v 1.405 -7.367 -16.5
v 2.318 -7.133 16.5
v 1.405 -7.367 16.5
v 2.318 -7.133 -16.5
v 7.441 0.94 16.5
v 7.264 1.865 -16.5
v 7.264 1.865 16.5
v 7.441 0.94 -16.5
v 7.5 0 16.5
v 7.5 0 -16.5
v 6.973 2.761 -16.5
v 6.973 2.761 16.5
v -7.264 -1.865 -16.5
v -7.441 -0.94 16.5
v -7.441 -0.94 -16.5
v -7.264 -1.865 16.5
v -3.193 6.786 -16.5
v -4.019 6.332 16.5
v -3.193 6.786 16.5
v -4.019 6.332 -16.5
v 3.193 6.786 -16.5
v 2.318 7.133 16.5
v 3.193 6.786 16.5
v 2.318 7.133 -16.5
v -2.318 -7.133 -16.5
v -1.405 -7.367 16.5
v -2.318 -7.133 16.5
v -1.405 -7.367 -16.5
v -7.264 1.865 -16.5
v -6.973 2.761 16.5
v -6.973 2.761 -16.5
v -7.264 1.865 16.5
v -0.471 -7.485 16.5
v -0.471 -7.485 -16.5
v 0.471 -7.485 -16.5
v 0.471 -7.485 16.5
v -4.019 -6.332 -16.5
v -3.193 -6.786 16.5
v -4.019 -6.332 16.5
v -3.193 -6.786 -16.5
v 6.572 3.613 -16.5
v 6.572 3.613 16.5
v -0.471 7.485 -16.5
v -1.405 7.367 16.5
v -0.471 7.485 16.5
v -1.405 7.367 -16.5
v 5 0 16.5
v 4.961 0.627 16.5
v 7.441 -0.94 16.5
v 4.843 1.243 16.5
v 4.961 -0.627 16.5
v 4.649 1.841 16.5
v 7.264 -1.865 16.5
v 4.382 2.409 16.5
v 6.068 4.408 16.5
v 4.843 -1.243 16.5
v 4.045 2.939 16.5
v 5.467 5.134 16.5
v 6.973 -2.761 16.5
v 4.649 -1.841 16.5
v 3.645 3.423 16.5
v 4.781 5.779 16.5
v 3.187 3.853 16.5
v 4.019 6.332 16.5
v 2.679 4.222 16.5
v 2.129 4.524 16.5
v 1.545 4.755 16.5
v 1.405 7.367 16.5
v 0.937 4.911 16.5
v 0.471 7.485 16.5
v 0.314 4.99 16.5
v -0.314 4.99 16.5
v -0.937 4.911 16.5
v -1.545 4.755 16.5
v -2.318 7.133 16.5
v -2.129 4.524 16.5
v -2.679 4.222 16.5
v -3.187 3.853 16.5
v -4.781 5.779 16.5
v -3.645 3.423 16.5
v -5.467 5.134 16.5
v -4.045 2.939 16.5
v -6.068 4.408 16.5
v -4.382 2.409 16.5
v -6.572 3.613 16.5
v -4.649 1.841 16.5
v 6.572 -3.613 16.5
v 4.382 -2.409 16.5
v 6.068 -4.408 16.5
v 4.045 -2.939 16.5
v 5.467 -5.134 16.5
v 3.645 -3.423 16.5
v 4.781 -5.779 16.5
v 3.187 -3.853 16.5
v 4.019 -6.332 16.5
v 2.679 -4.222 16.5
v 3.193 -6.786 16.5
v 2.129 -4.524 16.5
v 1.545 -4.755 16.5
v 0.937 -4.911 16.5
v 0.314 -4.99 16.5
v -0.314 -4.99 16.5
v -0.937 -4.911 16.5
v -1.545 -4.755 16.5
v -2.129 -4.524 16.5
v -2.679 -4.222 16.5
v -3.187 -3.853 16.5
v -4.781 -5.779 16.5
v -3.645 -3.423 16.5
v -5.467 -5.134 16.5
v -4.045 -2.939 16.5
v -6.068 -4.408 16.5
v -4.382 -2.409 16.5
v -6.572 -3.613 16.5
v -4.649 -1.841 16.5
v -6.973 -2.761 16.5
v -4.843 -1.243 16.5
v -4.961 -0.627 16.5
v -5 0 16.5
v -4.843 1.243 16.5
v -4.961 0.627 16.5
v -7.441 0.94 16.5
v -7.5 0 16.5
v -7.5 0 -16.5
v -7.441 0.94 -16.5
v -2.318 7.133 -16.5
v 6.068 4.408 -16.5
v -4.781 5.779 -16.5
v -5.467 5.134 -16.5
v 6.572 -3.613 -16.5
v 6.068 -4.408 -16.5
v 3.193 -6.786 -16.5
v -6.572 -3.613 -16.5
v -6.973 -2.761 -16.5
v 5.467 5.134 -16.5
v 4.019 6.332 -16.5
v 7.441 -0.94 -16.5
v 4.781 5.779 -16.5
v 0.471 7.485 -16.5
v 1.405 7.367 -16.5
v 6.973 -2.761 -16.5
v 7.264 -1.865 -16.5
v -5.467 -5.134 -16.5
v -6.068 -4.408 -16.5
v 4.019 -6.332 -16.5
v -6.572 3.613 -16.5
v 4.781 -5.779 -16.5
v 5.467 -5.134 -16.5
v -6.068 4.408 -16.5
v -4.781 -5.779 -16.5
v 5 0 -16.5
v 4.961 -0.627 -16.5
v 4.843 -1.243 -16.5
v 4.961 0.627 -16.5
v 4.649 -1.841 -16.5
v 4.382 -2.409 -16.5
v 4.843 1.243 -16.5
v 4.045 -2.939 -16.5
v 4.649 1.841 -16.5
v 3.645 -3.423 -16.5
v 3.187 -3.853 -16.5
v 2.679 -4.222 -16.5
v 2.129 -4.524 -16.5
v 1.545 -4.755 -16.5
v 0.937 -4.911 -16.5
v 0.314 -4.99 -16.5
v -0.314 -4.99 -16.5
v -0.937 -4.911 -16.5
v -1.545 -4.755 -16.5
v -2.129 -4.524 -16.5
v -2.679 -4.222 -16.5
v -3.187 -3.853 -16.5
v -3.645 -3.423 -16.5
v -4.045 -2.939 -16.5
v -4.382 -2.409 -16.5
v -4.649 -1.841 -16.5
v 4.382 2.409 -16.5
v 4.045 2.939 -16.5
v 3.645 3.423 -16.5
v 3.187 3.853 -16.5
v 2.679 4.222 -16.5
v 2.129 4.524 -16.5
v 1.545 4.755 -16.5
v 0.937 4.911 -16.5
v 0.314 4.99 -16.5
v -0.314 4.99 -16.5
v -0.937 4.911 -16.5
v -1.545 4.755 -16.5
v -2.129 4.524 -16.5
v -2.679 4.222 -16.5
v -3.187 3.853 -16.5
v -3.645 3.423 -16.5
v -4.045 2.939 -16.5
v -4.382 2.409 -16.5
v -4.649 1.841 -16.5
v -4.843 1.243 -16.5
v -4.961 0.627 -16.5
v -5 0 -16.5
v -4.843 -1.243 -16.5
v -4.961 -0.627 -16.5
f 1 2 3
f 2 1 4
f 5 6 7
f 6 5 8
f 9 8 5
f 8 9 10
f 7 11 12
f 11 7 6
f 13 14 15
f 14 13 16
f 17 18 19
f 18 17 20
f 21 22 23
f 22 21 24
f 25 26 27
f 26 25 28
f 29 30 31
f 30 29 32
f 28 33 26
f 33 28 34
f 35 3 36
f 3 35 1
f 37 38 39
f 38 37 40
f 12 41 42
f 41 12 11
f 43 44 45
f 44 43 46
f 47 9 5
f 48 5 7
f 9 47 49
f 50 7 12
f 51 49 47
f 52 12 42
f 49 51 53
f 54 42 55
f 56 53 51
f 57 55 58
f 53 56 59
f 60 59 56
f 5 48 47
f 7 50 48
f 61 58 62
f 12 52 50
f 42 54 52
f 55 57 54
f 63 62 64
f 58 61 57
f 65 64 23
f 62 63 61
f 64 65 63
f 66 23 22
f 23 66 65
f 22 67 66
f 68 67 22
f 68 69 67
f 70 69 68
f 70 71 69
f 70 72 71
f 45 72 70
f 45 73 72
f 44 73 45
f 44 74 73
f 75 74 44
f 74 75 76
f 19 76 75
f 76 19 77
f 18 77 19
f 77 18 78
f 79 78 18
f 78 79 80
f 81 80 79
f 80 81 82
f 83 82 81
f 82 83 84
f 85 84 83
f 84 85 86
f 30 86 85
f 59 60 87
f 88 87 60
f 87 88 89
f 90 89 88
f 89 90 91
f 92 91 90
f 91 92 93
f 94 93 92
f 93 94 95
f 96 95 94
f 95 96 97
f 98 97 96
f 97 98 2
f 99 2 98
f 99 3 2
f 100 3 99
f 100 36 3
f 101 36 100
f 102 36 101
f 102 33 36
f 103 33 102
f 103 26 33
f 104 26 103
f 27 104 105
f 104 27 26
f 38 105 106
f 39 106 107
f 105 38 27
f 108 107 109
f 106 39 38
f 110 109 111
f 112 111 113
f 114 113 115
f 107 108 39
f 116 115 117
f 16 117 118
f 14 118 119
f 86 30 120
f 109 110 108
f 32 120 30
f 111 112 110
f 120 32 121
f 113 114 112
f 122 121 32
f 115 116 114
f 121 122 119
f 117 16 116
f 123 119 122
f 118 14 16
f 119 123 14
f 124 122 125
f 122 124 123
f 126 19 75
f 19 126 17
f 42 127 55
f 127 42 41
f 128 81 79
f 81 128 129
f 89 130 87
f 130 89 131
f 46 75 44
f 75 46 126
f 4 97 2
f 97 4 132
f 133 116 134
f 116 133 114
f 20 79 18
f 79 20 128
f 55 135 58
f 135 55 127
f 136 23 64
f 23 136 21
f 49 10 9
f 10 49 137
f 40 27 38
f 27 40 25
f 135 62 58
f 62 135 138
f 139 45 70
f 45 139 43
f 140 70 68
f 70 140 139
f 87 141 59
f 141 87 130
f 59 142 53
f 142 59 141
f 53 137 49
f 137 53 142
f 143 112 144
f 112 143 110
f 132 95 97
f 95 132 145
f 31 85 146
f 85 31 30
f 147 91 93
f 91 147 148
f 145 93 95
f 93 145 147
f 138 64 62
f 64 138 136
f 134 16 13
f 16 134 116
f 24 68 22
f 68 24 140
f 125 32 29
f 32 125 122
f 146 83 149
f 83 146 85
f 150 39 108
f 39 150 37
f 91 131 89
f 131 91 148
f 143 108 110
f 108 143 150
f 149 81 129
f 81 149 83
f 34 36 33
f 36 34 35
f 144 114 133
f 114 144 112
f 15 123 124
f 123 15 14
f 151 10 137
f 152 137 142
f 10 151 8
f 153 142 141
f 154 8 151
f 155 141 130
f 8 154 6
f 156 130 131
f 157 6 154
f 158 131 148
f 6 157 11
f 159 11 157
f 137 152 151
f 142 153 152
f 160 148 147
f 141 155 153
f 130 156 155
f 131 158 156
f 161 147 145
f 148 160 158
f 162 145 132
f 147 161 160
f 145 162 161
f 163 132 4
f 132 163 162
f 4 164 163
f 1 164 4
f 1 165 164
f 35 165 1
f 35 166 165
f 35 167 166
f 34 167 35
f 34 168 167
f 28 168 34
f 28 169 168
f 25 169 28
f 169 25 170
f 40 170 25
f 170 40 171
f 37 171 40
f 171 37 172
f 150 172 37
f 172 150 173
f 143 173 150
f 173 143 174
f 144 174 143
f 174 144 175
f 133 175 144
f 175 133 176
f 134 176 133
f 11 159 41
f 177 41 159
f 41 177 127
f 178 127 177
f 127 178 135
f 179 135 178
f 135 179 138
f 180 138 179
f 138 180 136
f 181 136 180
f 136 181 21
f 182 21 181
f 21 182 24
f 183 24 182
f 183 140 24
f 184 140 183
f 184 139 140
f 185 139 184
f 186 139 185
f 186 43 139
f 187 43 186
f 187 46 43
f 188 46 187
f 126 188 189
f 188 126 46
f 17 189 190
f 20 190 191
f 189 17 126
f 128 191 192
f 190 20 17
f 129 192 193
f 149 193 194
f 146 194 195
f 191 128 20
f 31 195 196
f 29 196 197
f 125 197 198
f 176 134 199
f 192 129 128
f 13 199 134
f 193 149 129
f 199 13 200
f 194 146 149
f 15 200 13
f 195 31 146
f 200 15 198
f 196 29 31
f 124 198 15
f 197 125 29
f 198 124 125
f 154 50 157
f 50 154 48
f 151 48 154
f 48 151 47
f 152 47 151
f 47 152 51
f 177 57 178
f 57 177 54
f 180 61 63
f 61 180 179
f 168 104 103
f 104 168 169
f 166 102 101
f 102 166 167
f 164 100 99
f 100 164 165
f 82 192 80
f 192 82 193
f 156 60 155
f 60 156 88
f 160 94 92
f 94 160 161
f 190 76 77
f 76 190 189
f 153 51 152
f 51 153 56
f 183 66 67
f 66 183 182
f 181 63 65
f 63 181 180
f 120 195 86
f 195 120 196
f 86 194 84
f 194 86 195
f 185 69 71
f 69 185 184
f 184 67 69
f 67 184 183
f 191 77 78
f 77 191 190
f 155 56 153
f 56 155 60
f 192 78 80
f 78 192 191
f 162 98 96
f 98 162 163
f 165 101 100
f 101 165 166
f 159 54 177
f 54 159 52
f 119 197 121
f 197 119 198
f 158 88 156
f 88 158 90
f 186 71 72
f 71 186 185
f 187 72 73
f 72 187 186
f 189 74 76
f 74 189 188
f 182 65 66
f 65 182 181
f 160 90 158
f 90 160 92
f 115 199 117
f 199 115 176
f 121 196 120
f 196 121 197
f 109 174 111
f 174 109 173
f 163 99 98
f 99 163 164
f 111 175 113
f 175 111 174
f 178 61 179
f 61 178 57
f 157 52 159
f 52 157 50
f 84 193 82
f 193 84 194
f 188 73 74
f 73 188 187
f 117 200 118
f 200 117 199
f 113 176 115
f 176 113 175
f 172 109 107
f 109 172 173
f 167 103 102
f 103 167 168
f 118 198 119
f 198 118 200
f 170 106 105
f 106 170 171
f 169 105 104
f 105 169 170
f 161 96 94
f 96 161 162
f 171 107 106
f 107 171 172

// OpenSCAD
$fn = 50;


difference() {
	union() {
		translate(v = [0, 0, -16.5000000000]) {
			cylinder(h = 33, r = 7.5000000000);
		}
	}
	union() {
		translate(v = [0, 0, -100.0000000000]) {
			cylinder(h = 200, r = 5.0000000000);
		}
	}
}
